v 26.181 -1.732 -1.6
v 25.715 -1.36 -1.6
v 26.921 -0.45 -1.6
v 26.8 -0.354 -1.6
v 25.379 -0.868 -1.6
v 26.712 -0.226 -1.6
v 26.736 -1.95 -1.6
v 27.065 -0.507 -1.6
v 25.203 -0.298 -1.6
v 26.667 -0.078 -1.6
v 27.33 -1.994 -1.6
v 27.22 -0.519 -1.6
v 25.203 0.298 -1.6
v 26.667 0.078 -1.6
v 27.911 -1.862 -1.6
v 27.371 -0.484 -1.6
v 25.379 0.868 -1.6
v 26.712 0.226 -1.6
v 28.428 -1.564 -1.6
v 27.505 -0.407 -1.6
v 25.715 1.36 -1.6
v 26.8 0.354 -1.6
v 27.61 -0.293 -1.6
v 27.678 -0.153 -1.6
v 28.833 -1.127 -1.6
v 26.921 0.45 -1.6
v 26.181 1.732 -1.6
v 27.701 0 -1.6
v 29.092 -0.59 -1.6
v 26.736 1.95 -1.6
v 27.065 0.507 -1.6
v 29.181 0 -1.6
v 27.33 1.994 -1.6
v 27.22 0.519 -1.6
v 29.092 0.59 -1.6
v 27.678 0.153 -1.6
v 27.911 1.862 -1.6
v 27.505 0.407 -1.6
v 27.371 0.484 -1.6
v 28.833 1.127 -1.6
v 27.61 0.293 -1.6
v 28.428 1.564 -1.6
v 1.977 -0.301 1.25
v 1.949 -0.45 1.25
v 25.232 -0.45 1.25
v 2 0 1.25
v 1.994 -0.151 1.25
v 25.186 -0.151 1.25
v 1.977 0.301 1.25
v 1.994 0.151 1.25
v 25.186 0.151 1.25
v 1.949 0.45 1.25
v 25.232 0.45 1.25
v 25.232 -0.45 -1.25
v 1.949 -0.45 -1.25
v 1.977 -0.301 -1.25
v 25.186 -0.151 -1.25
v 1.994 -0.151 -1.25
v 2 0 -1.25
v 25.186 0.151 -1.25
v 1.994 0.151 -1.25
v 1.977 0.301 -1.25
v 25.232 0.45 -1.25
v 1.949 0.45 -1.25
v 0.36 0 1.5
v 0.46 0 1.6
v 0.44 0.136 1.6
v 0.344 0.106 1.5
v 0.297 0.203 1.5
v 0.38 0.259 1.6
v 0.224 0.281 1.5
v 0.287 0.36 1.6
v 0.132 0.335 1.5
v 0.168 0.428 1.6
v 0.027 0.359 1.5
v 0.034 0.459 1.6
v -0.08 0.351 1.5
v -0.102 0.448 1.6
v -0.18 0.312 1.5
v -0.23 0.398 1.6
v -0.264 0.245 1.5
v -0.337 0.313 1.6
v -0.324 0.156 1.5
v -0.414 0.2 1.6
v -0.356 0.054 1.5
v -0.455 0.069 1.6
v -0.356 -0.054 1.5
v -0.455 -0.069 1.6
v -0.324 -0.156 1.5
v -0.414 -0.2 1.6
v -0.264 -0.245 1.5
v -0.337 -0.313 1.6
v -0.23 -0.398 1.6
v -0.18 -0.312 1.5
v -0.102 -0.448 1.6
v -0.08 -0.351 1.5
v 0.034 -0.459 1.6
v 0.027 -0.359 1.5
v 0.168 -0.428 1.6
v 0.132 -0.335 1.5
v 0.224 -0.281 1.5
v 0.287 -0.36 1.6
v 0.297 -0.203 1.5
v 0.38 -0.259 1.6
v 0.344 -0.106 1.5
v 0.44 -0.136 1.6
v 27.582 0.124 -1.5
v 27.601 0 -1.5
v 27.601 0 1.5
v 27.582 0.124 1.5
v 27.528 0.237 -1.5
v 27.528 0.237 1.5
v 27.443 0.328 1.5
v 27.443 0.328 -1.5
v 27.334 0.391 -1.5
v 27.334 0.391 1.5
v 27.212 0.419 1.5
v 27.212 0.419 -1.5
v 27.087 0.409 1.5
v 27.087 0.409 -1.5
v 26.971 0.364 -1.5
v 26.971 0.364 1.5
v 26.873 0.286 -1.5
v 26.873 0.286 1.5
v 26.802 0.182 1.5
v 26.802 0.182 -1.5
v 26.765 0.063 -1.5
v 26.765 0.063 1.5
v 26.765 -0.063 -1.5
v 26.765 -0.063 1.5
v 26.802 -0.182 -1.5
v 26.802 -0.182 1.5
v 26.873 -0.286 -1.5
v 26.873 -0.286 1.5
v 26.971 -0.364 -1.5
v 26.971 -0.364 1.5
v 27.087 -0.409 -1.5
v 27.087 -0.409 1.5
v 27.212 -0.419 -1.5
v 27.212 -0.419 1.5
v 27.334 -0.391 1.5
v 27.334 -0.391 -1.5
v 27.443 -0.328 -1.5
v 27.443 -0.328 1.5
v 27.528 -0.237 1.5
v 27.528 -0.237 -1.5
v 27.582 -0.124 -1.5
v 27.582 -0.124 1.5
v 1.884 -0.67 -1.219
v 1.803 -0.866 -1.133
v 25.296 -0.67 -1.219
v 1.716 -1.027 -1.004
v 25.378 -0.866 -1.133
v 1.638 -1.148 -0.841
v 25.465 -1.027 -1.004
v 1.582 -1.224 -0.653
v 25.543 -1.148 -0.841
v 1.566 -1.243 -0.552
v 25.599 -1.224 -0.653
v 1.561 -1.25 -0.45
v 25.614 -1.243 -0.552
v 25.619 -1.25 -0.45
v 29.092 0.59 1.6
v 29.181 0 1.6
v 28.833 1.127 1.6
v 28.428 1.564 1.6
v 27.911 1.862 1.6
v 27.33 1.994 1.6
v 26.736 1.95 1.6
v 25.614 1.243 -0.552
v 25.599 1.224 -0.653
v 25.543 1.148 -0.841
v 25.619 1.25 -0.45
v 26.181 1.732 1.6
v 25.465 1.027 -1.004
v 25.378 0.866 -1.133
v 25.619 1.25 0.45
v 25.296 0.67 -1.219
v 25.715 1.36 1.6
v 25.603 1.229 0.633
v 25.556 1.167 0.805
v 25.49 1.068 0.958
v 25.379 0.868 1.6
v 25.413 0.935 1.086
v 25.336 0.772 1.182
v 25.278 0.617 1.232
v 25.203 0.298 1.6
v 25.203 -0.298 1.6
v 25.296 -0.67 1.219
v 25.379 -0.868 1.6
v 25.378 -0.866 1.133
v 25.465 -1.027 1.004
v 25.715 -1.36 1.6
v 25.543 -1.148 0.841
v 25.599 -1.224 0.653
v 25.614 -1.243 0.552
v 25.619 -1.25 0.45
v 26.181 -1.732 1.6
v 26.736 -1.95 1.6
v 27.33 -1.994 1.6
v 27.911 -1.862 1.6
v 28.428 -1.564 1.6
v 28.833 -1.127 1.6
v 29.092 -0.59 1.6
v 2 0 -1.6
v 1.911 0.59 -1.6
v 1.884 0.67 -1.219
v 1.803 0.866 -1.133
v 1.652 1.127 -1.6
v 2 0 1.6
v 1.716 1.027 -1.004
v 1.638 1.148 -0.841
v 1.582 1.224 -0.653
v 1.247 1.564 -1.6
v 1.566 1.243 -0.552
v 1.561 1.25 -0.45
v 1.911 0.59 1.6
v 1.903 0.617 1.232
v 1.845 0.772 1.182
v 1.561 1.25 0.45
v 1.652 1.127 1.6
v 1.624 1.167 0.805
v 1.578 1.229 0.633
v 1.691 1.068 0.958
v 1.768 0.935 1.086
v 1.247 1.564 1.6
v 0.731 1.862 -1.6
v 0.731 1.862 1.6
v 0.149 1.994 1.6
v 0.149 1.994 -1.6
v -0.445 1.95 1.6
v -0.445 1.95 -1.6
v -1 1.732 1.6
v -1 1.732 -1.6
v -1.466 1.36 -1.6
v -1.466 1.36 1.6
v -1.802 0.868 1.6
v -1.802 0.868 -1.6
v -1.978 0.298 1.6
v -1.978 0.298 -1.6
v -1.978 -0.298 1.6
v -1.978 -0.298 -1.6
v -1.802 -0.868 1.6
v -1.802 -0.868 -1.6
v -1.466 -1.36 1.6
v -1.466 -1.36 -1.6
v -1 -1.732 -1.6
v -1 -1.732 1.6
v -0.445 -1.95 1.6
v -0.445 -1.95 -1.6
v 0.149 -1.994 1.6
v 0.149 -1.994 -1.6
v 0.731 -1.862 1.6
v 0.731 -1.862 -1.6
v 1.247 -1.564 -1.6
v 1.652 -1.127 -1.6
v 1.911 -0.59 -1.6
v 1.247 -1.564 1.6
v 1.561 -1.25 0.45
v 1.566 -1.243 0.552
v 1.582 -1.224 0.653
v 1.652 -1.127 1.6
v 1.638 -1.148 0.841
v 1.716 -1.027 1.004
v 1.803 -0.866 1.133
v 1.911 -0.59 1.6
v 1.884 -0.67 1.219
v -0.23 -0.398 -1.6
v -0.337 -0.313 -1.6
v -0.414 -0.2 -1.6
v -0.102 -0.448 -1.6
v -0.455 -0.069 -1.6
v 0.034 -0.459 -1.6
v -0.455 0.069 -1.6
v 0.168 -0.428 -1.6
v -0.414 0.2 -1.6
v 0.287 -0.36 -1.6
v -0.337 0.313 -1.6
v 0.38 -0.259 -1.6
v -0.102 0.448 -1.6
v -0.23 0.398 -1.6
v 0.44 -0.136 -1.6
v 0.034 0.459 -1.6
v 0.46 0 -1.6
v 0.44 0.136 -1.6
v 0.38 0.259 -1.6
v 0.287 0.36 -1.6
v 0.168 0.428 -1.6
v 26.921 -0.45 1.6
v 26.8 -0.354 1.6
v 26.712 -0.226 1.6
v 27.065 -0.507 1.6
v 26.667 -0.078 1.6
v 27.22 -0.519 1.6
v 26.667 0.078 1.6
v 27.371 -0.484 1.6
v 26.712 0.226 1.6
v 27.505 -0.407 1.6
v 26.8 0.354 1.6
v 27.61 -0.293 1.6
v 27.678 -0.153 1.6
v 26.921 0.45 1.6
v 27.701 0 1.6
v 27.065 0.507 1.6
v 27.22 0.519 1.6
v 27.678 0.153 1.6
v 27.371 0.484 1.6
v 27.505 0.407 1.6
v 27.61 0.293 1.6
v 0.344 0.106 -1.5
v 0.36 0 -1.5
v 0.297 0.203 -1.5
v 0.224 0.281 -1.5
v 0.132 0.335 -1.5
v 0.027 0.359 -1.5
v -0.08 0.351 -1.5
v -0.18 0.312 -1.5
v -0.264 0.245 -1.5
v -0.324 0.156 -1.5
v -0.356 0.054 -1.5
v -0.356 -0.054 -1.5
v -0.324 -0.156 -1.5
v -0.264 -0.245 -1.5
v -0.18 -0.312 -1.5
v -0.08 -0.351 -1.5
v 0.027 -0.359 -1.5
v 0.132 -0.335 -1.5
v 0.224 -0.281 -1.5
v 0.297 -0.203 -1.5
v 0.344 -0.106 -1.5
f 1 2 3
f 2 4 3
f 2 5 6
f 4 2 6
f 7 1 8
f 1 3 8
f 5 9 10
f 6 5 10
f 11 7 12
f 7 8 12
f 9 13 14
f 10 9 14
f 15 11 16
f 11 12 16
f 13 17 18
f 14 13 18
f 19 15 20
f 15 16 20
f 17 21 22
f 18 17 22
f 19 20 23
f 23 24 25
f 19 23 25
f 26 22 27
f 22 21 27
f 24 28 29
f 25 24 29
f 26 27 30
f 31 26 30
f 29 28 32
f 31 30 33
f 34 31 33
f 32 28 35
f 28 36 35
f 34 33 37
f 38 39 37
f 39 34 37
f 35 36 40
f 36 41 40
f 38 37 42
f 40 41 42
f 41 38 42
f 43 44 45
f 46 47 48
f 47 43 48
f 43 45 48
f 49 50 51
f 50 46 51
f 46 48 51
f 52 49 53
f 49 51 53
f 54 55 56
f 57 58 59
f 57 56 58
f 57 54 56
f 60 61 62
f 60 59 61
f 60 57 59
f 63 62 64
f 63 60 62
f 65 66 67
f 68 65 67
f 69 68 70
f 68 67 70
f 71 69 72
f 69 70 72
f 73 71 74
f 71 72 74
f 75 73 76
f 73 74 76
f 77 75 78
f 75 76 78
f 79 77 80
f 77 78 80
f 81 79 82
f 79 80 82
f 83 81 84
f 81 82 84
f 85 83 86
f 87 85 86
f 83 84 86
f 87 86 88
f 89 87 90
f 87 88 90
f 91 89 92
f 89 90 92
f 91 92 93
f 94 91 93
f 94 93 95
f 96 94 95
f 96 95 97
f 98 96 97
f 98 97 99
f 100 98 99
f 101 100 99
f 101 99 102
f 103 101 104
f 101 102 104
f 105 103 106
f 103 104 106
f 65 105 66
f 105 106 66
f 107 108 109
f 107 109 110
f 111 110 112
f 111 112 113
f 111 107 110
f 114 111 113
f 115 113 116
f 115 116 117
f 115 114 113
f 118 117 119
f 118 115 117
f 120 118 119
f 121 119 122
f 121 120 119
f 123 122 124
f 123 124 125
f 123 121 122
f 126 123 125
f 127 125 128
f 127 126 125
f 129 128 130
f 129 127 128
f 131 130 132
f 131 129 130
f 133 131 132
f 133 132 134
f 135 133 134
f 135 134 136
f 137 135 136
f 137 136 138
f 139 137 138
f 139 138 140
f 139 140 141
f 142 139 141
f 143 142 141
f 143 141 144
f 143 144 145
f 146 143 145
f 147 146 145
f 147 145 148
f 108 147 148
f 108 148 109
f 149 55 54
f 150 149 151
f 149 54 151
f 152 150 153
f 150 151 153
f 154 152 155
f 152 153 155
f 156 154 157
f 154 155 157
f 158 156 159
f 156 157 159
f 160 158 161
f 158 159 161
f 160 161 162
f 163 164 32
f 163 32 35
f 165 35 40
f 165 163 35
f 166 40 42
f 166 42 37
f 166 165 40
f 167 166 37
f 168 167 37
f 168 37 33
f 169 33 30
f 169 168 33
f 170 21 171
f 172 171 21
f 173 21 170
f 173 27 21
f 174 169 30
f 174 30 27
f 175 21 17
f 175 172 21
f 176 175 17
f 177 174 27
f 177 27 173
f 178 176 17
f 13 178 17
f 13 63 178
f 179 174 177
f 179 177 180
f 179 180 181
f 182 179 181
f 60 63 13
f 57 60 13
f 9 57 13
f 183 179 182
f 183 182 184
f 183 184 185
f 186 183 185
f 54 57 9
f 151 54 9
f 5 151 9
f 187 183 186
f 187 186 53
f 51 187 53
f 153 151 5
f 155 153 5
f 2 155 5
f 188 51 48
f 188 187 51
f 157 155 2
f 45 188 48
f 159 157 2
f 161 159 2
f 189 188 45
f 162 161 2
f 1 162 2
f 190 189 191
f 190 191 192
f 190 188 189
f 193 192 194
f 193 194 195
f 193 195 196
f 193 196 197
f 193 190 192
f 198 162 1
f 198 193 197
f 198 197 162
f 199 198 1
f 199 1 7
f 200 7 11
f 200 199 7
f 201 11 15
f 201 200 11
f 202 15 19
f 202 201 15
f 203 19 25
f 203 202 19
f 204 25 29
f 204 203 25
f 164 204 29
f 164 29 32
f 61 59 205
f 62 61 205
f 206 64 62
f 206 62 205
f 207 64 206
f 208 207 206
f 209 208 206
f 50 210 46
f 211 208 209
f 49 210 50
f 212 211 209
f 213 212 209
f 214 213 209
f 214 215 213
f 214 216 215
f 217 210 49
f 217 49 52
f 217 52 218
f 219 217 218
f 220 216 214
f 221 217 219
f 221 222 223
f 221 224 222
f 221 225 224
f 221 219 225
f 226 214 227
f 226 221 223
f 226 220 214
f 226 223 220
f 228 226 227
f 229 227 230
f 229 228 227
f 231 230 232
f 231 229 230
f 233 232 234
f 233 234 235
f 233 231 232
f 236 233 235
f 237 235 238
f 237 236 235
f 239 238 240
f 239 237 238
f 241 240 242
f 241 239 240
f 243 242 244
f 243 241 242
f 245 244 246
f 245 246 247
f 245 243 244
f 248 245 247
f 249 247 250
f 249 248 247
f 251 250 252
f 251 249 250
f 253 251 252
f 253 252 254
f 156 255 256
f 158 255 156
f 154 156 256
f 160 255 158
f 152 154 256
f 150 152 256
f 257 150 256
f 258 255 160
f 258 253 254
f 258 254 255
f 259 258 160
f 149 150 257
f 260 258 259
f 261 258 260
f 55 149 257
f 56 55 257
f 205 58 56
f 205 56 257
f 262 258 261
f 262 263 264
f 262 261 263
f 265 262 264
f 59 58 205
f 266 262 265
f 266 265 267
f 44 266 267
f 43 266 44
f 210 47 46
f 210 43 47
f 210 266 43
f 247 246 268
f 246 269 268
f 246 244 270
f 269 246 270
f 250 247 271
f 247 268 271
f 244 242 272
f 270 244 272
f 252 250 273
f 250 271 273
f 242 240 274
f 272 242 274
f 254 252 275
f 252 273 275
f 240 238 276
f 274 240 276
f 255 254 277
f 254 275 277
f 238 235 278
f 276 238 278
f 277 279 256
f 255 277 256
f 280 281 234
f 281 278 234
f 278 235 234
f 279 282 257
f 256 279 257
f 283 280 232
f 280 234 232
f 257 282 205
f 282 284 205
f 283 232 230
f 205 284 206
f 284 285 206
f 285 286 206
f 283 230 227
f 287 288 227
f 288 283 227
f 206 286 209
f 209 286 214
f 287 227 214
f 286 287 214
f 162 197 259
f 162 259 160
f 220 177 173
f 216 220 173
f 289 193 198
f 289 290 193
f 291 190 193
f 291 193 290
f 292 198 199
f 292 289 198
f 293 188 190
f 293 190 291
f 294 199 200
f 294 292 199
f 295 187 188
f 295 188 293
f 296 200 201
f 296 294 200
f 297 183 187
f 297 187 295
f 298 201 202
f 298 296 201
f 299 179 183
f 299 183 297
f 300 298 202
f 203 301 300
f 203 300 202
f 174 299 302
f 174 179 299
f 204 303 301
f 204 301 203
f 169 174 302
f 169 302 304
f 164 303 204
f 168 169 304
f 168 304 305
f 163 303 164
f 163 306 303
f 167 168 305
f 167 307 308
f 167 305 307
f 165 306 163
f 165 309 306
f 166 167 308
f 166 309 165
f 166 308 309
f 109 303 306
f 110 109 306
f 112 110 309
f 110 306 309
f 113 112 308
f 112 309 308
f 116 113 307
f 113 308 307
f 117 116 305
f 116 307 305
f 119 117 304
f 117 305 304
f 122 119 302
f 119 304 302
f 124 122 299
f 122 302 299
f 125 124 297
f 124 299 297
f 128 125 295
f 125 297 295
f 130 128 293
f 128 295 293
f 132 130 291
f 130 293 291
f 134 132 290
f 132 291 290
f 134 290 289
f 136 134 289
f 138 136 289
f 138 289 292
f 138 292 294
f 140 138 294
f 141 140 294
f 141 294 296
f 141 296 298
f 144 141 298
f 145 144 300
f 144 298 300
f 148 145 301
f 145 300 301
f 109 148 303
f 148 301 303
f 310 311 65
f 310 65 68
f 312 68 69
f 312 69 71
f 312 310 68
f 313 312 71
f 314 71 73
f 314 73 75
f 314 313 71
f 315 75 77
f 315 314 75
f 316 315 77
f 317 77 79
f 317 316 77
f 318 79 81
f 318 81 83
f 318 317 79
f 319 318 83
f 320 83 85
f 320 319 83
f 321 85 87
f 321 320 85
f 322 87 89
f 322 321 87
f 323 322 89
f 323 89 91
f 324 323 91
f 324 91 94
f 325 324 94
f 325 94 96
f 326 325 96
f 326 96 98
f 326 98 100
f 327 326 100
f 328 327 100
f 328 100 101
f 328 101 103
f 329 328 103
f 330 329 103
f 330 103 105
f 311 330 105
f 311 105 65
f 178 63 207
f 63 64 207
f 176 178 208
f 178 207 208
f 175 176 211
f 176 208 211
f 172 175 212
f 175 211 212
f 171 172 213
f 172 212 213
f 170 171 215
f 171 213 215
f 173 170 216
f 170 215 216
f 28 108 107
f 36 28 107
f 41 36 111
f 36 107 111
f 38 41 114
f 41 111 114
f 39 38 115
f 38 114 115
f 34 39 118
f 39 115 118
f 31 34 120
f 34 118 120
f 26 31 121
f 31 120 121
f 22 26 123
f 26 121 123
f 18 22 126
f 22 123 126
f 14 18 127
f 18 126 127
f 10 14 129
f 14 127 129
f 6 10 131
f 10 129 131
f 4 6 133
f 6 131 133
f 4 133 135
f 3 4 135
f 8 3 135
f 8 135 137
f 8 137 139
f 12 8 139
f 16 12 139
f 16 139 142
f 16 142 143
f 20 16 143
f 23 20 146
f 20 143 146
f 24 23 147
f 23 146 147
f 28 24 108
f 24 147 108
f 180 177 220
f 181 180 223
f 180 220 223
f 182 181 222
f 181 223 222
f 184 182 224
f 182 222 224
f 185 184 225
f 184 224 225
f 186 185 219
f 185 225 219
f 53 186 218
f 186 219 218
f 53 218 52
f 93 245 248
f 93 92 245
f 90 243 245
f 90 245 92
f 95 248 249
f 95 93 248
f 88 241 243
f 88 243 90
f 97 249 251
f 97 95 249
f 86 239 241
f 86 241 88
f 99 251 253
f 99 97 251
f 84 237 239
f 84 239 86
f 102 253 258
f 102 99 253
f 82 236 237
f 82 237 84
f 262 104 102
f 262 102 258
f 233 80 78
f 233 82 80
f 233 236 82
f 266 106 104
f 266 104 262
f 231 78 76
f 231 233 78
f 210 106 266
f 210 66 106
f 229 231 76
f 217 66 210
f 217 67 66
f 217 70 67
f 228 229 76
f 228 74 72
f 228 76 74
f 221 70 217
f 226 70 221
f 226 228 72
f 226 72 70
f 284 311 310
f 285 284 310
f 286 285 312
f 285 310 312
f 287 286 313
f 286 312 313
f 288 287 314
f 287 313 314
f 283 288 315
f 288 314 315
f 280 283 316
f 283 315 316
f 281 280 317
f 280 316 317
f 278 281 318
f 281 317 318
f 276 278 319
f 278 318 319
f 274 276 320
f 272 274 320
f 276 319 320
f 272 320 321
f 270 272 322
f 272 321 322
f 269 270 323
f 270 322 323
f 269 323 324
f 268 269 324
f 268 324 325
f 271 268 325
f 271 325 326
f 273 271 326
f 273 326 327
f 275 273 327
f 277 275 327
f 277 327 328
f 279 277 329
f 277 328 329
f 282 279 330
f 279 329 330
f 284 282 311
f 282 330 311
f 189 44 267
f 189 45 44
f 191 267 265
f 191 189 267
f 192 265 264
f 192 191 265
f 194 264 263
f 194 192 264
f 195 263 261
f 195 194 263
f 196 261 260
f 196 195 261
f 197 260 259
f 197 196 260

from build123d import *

# Parameters (mm, degrees)
SKETCH_1_R                       = 2
SKETCH_1_R_2                     = 0.36
EXTRUDE_1_DEPTH                  = 1.6
SKETCH_1_R_3                     = 0.42
EXTRUDE_1_2_DEPTH                = 1.6
EXTRUDE_2_REACH                  = 28.306
EXTRUDE_2_END_RADIUS             = 2
SKETCH_2_W                       = 2.5
SKETCH_2_H                       = 2.5
EXTRUDE_2_DIRECTION_2_REACH      = 28.306
EXTRUDE_2_DIRECTION_2_END_RADIUS = 2
CHAMFER_1_SIZE                   = 0.1
FILLET_1_R                       = 0.8


with BuildPart() as part:
    # 草图1 → 凸台-拉伸1 (new, symmetric)
    with BuildSketch(Plane.XY):
        Circle(SKETCH_1_R)
        Circle(SKETCH_1_R_2, mode=Mode.SUBTRACT)
    extrude(amount=EXTRUDE_1_DEPTH, both=True)



with BuildPart() as body_2:
    # 草图1 → Extrude 1 2 (new, symmetric)
    with BuildSketch(Plane.XY):
        with Locations((27.180718048, 0)):
            Circle(SKETCH_1_R)
        with Locations((27.180718048, 0)):
            Circle(SKETCH_1_R_3, mode=Mode.SUBTRACT)
    extrude(amount=EXTRUDE_1_2_DEPTH, both=True)


with BuildPart() as part_1:
    add(part.part)

    add(body_2.part)  # 凸台-拉伸2 merges body 2
    # 凸台-拉伸2: up to this cylinder (the profile starts outside it)
    extrude_2_end = Plane(origin=(27.180718048, 0, 0), z_dir=(0, 0, -1)) * Cylinder(EXTRUDE_2_END_RADIUS, 61.612, mode=Mode.PRIVATE)
    # 草图2 → 凸台-拉伸2 (add, up to the surface)
    with BuildSketch(Plane(origin=(3, 0, 0), x_dir=(0, 0, -1), z_dir=(1, 0, 0)), mode=Mode.PRIVATE) as extrude_2_sk1:
        Rectangle(SKETCH_2_W, SKETCH_2_H)
    extrude_2_tool1 = extrude(extrude_2_sk1.sketch, amount=EXTRUDE_2_REACH, mode=Mode.PRIVATE) - extrude_2_end
    add(extrude_2_tool1.solids().sort_by_distance((3, 0, 0))[0])

    # 凸台-拉伸2 direction 2: up to this cylinder (the profile starts outside it)
    extrude_2_direction_2_end = Plane(origin=(0, 0, 0), z_dir=(0, 0, -1)) * Cylinder(EXTRUDE_2_DIRECTION_2_END_RADIUS, 61.612, mode=Mode.PRIVATE)
    # 草图2 → 凸台-拉伸2 direction 2 (add, up to the surface)
    with BuildSketch(Plane(origin=(3, 0, 0), x_dir=(0, 0, -1), z_dir=(1, 0, 0)), mode=Mode.PRIVATE) as extrude_2_direction_2_sk1:
        Rectangle(SKETCH_2_W, SKETCH_2_H)
    extrude_2_direction_2_tool1 = extrude(extrude_2_direction_2_sk1.sketch, amount=-EXTRUDE_2_DIRECTION_2_REACH, mode=Mode.PRIVATE) - extrude_2_direction_2_end
    add(extrude_2_direction_2_tool1.solids().sort_by_distance((3, 0, 0))[0])

    # 倒角1
    chamfer_1_edges = [part_1.edges().sort_by_distance(p)[0] for p in [
        (26.760718048, 0, -1.6),
        (26.760718048, 0, 1.6),
        (-0.36, 0, -1.6),
        (-0.36, 0, 1.6),
    ]]
    chamfer(chamfer_1_edges, length=CHAMFER_1_SIZE)

    # 圆角1
    fillet_1_edges = [part_1.edges().sort_by_distance(p)[0] for p in [
        (13.590359024, -1.25, 1.25),
        (13.590359024, -1.25, -1.25),
        (13.590359024, 1.25, -1.25),
        (13.590359024, 1.25, 1.25),
    ]]
    fillet(fillet_1_edges, radius=FILLET_1_R)


solid = part_1.part
